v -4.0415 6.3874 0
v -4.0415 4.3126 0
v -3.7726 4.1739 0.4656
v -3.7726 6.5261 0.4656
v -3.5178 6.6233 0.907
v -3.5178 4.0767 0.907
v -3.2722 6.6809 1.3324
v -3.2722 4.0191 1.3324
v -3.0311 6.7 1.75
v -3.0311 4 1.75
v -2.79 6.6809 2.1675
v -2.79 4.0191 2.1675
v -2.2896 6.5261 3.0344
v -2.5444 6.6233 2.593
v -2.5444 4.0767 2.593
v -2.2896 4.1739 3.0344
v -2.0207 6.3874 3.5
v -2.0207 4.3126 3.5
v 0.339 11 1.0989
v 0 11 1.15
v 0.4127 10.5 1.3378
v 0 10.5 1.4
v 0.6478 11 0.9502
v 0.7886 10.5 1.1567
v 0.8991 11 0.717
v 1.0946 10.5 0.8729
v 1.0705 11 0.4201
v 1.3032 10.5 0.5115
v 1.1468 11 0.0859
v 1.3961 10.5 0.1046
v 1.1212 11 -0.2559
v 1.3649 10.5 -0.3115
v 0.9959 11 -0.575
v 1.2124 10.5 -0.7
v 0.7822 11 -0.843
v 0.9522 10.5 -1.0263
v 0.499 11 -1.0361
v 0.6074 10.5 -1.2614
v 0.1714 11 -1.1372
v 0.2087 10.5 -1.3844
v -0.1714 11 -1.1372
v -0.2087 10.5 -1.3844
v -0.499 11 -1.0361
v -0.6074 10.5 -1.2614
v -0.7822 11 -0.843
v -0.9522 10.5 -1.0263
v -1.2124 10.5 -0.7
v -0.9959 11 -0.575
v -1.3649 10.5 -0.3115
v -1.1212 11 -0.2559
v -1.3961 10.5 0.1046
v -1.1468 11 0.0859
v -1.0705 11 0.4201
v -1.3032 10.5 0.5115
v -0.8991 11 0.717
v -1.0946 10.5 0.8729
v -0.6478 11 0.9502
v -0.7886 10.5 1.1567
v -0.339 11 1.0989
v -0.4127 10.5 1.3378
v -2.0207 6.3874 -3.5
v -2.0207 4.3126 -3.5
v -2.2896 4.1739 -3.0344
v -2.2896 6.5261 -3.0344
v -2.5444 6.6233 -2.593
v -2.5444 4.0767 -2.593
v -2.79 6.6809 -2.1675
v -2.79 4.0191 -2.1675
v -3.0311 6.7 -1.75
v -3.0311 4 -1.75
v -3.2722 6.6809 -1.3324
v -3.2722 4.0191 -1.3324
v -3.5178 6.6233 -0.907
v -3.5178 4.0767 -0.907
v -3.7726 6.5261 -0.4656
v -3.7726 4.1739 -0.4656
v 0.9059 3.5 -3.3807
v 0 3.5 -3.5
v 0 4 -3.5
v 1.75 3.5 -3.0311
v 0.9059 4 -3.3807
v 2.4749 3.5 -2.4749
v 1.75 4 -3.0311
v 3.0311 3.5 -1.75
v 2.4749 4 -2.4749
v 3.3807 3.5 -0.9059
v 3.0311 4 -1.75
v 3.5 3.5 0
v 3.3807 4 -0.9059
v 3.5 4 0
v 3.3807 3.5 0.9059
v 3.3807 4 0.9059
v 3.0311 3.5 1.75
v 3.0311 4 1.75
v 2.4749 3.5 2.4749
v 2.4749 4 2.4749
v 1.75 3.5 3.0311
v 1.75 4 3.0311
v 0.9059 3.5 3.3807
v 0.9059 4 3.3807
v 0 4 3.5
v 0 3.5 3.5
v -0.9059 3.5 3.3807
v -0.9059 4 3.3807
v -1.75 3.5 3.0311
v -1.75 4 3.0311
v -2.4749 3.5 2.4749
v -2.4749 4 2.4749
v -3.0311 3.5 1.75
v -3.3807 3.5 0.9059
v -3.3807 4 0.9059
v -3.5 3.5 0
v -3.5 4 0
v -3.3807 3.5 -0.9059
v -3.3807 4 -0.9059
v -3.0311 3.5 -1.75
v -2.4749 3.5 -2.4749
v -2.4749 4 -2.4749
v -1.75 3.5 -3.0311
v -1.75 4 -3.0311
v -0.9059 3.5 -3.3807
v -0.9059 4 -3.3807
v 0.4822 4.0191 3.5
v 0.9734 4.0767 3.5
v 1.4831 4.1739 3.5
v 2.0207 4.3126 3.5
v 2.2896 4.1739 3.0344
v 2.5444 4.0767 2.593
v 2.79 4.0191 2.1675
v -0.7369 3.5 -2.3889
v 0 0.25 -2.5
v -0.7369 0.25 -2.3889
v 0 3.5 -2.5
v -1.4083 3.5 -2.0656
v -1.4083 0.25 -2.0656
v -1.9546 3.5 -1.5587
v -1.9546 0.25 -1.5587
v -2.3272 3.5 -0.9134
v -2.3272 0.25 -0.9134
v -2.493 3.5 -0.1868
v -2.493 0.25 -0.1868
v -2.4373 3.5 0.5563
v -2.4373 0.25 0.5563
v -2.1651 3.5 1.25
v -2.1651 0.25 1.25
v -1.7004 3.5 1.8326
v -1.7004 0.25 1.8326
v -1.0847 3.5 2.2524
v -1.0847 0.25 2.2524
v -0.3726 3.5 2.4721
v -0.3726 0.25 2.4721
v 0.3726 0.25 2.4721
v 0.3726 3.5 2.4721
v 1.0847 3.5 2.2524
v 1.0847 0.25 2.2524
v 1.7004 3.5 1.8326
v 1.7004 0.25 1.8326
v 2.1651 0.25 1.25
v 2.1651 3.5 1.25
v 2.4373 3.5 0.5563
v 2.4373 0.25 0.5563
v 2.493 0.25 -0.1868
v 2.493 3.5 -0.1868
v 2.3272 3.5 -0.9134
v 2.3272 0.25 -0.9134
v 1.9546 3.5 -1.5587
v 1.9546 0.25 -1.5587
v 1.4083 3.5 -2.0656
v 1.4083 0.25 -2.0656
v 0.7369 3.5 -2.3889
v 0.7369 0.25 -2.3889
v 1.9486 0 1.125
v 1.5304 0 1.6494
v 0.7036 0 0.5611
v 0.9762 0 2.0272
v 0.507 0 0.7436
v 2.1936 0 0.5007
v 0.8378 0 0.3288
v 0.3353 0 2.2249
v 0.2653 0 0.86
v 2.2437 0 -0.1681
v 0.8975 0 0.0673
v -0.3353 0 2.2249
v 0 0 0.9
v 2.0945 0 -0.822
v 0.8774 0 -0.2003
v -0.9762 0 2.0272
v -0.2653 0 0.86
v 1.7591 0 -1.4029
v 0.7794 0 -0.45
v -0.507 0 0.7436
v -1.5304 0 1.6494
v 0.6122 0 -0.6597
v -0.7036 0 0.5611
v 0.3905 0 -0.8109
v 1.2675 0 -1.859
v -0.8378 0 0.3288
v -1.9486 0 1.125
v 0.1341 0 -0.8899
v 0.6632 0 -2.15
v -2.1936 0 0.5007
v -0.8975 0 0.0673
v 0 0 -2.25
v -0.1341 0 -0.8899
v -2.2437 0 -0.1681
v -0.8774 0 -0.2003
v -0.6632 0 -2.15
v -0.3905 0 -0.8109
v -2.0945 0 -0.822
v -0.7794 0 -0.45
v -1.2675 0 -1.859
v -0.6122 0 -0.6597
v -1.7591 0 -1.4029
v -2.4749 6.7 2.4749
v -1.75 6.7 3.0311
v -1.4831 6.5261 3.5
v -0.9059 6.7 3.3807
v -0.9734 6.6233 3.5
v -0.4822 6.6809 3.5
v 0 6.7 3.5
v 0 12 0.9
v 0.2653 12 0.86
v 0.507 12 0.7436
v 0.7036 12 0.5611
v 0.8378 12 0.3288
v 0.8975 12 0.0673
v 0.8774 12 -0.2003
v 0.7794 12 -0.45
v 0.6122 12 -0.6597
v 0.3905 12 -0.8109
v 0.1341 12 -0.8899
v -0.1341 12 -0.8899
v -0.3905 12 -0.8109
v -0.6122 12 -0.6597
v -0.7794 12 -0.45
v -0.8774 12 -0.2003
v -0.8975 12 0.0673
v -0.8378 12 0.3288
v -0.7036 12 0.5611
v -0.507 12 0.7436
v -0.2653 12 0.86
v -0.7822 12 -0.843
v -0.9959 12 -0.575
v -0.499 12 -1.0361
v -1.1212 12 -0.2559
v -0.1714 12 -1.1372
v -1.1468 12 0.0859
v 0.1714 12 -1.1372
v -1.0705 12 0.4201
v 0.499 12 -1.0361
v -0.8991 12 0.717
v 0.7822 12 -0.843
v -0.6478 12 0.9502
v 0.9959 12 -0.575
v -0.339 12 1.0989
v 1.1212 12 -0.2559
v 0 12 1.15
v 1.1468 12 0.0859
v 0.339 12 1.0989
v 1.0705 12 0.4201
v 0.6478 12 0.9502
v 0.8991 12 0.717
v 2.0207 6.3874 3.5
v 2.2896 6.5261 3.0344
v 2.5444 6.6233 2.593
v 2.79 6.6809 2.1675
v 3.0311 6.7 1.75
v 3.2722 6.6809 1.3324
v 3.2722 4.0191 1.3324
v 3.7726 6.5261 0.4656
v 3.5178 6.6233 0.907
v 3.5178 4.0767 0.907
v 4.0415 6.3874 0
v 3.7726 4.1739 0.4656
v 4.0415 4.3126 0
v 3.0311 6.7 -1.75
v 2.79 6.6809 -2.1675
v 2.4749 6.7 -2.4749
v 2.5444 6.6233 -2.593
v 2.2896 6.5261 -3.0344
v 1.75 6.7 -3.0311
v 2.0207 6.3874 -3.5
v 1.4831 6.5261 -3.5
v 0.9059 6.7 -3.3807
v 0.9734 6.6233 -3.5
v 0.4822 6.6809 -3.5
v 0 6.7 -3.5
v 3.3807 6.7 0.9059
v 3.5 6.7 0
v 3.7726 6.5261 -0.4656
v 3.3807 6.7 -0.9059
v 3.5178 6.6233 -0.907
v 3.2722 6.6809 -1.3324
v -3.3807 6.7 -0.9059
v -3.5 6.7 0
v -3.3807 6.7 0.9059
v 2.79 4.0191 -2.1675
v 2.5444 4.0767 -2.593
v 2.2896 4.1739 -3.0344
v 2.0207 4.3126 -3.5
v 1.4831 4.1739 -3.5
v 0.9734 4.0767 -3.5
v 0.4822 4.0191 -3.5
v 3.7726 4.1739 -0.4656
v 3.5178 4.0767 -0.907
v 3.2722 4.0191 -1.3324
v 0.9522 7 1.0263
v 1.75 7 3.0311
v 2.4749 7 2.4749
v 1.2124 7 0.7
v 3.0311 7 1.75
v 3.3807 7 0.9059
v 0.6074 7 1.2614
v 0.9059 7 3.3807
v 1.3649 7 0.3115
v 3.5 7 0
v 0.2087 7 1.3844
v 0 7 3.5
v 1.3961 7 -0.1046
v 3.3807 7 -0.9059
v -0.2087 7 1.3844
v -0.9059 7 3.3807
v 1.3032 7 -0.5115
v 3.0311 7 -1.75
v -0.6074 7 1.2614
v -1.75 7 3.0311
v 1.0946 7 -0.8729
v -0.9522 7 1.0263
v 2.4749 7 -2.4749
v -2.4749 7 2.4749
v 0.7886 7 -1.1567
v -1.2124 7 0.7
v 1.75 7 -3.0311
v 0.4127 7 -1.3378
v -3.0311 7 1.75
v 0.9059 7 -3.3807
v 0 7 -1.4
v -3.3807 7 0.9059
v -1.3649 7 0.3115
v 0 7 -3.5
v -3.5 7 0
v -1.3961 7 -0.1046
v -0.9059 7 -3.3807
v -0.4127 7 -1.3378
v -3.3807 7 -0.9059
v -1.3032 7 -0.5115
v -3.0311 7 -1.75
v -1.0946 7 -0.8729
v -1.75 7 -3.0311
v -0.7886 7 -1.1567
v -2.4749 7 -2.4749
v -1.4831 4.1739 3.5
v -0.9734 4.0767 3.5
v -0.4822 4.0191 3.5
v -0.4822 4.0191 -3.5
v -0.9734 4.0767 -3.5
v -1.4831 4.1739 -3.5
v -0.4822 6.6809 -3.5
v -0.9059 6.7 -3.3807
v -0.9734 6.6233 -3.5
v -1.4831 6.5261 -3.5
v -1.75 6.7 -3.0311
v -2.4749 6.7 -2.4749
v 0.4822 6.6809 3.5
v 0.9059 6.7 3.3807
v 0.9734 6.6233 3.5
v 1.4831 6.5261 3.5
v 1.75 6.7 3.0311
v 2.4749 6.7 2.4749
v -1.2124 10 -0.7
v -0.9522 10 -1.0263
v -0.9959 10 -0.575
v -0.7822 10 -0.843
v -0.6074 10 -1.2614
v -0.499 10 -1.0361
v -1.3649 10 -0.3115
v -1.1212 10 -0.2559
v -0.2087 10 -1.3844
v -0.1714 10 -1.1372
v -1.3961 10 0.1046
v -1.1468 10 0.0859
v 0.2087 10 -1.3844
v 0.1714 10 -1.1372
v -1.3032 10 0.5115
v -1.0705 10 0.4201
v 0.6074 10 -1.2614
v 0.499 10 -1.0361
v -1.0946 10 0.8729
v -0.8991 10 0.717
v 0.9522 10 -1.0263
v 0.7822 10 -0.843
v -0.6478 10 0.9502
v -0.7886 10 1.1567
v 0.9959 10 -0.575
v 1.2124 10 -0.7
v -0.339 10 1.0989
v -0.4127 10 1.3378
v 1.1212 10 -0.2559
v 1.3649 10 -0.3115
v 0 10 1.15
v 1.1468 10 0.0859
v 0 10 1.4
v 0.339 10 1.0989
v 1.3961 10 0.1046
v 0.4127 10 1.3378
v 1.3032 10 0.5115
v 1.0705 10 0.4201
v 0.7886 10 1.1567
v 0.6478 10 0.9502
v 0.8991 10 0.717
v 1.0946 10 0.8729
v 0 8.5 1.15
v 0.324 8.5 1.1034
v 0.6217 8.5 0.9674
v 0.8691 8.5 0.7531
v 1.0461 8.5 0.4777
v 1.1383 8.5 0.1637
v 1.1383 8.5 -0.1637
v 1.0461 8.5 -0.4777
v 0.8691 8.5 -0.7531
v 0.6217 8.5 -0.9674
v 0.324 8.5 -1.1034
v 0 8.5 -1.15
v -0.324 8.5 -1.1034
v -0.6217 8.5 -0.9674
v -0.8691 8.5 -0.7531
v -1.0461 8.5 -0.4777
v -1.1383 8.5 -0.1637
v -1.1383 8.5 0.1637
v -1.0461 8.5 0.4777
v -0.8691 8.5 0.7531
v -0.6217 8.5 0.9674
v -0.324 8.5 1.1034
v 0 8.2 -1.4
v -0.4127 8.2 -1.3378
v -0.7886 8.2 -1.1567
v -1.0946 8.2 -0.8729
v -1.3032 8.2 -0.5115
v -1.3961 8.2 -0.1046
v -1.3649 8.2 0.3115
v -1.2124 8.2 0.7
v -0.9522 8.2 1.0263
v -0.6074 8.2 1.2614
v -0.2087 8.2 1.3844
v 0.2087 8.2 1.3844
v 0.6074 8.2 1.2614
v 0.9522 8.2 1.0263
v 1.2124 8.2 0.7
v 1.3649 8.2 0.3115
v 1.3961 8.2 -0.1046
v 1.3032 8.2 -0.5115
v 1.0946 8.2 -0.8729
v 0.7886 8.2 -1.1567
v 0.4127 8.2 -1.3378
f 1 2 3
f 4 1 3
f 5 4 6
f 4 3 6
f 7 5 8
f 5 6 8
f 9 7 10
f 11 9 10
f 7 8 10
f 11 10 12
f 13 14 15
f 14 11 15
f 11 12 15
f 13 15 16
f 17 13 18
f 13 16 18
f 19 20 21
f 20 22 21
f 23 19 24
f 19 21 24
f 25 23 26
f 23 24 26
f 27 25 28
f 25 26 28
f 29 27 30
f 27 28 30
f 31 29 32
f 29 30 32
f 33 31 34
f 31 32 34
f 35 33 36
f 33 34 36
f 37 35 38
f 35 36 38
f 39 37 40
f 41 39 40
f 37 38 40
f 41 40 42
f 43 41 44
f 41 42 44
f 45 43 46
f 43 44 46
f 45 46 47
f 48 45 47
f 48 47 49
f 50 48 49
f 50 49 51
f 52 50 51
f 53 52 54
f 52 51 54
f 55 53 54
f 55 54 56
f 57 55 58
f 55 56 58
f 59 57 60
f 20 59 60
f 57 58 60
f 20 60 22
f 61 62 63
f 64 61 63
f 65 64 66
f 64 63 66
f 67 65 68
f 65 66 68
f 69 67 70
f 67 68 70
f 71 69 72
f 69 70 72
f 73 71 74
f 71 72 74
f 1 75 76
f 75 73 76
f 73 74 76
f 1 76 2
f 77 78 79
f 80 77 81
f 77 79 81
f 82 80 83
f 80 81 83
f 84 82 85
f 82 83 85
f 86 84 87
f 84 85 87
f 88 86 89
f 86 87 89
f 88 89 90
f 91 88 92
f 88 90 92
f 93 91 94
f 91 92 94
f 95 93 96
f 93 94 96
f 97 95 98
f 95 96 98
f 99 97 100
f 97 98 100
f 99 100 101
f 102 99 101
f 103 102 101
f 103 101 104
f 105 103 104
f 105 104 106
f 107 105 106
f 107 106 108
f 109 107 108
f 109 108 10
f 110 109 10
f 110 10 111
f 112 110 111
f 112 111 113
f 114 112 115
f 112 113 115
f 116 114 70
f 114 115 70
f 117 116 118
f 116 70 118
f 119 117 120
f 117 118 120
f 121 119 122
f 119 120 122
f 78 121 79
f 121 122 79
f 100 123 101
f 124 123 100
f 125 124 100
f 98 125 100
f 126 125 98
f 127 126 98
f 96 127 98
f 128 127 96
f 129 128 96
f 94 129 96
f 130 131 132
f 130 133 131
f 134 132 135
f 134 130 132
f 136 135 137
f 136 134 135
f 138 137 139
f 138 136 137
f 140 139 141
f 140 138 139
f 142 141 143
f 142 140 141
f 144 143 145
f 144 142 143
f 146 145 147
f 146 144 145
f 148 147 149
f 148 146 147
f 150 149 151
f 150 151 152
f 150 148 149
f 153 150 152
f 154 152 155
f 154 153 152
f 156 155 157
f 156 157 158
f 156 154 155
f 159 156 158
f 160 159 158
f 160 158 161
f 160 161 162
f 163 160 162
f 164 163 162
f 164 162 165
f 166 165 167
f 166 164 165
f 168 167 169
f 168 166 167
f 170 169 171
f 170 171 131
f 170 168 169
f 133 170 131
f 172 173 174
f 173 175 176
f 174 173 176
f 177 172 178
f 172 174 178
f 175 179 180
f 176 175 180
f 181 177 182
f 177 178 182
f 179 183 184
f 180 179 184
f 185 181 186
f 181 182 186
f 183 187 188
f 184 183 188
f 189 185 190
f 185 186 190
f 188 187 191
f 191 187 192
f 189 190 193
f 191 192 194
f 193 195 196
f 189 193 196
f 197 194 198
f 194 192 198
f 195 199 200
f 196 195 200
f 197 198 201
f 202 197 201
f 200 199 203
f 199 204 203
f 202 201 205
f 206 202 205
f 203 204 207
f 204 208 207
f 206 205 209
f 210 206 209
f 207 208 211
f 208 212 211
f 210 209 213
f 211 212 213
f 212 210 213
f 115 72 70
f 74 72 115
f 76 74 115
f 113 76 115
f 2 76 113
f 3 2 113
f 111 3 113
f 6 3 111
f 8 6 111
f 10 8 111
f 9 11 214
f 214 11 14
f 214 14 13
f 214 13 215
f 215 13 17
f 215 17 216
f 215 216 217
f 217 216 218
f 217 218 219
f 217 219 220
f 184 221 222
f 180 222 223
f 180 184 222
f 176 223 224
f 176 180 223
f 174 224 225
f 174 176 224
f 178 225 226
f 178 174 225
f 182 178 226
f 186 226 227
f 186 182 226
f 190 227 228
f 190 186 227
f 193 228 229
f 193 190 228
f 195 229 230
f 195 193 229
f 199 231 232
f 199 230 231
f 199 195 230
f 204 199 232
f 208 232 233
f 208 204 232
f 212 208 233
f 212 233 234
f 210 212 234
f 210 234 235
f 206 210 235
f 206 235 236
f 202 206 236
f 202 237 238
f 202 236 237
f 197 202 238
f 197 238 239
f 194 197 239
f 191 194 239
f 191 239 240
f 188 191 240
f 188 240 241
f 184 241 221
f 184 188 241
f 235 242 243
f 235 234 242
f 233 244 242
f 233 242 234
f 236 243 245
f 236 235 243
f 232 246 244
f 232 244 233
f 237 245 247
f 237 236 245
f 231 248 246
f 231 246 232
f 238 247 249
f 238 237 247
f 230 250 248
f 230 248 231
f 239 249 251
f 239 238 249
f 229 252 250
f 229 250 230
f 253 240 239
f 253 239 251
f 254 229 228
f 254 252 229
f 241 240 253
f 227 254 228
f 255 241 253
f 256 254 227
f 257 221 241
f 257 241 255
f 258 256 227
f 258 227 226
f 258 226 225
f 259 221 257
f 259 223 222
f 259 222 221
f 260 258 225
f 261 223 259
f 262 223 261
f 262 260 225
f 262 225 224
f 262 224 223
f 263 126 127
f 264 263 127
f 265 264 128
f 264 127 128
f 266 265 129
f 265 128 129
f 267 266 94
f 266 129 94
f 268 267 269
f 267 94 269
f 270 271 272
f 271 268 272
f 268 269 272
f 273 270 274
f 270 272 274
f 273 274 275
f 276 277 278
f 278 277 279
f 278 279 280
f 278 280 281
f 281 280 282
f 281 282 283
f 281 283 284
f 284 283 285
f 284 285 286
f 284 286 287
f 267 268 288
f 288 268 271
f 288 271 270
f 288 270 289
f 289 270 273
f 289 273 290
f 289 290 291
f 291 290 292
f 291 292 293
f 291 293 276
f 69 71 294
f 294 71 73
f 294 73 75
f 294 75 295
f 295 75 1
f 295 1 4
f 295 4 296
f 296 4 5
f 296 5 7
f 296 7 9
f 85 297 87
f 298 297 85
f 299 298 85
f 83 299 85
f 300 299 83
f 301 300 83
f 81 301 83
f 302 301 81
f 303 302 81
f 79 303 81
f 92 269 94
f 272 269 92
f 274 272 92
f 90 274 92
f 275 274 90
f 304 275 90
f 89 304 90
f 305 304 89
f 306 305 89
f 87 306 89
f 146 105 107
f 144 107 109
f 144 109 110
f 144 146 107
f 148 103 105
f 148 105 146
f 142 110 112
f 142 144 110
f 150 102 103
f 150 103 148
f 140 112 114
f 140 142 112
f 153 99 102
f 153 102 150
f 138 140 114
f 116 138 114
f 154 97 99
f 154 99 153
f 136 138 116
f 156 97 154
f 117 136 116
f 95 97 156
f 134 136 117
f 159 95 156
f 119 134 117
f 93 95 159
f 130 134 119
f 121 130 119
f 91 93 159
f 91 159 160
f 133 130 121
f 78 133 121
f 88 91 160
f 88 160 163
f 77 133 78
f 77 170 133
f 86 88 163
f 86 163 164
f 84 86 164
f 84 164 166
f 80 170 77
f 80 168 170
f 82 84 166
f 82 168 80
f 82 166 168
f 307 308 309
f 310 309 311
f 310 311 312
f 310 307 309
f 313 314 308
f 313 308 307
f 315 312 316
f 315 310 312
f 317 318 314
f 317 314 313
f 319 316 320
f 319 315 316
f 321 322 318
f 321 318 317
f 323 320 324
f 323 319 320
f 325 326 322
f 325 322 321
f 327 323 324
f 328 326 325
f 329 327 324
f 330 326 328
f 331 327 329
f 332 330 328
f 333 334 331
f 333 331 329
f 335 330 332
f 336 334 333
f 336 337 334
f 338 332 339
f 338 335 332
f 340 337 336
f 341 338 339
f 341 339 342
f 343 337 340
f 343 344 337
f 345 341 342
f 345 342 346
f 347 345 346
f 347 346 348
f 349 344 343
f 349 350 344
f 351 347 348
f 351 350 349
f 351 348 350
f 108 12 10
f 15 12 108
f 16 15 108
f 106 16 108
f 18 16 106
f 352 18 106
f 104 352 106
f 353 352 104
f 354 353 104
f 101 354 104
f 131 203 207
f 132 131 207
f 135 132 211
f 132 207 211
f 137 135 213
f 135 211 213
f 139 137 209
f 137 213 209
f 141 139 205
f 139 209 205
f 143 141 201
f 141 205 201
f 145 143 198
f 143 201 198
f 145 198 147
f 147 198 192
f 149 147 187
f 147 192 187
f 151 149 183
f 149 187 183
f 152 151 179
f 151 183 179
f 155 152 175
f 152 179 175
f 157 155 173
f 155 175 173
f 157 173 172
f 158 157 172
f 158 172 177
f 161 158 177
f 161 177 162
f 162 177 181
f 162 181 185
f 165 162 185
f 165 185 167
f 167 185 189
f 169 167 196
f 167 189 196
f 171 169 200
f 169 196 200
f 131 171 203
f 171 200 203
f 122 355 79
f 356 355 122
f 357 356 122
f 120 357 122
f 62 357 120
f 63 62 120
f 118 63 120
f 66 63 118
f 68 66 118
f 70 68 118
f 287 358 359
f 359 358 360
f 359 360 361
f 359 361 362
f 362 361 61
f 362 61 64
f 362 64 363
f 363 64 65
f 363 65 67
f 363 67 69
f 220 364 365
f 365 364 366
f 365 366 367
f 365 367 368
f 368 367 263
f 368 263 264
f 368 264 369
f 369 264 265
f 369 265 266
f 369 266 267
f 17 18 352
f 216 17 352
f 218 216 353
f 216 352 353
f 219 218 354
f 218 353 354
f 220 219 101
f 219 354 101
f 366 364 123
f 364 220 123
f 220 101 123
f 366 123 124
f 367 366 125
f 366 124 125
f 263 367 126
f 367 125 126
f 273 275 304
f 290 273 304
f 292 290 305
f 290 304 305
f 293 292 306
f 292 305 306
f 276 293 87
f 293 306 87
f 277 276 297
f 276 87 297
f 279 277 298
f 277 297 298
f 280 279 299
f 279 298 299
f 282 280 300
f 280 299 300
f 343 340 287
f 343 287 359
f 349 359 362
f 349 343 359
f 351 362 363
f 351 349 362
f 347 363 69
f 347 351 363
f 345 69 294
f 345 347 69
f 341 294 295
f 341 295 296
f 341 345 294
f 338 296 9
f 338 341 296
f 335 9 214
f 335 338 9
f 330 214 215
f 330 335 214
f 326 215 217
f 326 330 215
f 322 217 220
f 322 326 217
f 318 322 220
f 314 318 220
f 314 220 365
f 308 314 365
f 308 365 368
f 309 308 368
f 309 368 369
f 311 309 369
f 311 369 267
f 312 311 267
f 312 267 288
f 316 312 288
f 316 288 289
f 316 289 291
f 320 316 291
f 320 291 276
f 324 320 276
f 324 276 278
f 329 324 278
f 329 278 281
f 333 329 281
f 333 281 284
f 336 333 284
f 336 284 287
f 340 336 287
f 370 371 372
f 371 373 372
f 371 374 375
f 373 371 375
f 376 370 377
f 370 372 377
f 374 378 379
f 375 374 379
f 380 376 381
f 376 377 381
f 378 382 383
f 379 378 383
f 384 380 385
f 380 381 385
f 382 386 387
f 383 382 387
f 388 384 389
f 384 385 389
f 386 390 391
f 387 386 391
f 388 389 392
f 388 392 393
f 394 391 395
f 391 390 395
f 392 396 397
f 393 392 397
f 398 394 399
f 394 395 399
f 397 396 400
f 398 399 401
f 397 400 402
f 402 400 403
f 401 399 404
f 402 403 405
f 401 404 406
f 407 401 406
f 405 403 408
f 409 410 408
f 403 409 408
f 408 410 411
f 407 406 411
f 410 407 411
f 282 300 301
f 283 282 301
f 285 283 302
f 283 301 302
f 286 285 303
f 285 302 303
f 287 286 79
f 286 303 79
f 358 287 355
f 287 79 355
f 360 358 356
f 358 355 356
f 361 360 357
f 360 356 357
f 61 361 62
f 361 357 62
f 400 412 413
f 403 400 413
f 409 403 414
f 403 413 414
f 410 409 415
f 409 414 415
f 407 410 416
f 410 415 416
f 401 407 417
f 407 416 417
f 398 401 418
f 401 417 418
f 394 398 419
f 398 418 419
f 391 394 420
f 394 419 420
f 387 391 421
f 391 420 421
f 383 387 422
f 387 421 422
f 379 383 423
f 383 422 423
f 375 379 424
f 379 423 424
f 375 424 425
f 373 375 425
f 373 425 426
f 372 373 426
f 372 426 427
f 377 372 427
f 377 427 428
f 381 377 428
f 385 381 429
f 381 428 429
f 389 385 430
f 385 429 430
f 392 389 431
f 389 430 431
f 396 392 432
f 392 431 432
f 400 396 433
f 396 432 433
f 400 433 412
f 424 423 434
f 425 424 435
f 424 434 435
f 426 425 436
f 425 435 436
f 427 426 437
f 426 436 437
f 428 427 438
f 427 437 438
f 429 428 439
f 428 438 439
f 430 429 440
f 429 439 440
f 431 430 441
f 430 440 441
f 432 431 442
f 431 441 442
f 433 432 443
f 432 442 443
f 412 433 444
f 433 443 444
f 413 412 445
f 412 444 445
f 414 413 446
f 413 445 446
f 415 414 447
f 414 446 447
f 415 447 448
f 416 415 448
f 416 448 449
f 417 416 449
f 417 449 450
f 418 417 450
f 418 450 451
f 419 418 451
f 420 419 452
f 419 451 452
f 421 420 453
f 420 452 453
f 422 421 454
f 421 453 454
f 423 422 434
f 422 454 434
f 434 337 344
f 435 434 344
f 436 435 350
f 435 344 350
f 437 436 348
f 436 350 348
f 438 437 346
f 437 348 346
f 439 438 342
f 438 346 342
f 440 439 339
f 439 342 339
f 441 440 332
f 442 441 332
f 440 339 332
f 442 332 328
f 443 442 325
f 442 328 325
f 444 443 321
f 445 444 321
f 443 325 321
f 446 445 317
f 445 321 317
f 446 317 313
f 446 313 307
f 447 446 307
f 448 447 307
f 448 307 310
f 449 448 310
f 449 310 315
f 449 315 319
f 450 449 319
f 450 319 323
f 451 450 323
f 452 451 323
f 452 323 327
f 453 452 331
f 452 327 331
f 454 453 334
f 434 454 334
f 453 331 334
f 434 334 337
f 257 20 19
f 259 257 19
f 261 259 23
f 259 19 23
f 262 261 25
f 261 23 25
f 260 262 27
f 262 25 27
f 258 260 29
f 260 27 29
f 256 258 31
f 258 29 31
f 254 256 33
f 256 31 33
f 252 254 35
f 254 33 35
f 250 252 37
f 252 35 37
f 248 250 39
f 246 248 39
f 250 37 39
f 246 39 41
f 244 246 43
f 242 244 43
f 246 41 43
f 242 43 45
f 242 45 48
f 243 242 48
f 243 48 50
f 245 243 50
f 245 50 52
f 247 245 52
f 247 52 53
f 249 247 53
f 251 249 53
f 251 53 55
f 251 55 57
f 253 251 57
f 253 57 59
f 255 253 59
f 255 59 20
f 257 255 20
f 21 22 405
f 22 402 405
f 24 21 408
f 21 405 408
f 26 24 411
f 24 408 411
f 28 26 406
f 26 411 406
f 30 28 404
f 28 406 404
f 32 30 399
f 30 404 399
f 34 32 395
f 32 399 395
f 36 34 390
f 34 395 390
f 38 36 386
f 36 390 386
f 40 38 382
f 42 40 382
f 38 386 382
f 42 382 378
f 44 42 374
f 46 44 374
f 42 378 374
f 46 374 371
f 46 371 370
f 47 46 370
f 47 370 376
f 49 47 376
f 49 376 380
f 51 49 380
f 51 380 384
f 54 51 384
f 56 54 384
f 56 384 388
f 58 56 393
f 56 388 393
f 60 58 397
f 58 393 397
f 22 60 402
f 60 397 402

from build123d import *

# Parameters (mm, degrees)
THREADS_SKETCH_W  = 2.5
THREADS_SKETCH_H  = 4
THREADS_CHAM_SIZE = 0.25
NUT_DEPTH         = 2.7
GASKET_SKETCH_R   = 3.5
GASKET_DEPTH      = 0.5
STEM_SKETCH_R     = 1.15
STEM_DEPTH        = 5.3
TOP_START         = 0.3
TOP_FLAT_SKETCH_R = 3.5
TOP_FLAT_DEPTH    = 0.3
PORT_SKETCH_R     = 0.9
PORT_DEPTH        = 14.137097599


with BuildPart() as part:
    # Threads_Sketch → Threads (revolve)
    with BuildSketch(Plane.XY, mode=Mode.PRIVATE) as threads_sk:
        with Locations((-1.25, 2)):
            Rectangle(THREADS_SKETCH_W, THREADS_SKETCH_H)
    revolve(threads_sk.sketch.rotate(Axis((0, 0, 0), (0, 1, 0)), 270), axis=Axis((0, 0, 0), (0, 1, 0)))

    # Threads Cham
    threads_cham_edges = [part.edges().sort_by_distance(p)[0] for p in [
        (0, 0, 2.5),
    ]]
    chamfer(threads_cham_edges, length=THREADS_CHAM_SIZE)

    # Nut_Sketch → Nut (add)
    with BuildSketch(Plane(origin=(0, 4, 0), x_dir=(-1, 0, 0), z_dir=(0, 1, 0))):
        Polygon((-4.041451884, 0), (-2.020725942, -3.5), (2.020725942, -3.5), (4.041451884, 0), (2.020725942, 3.5), (-2.020725942, 3.5), align=None)
    extrude(amount=NUT_DEPTH)

    # Nut Cham_Sketch → Nut Cham (revolve, cut)
    with BuildSketch(Plane.XY, mode=Mode.PRIVATE) as nut_cham_sk:
        Polygon((-4.041451884, 4.312607391), (-4.041451884, 4), (-3.5, 4), align=None)
        Polygon((-3.5, 6.7), (-4.041451884, 6.387392609), (-4.041451884, 6.7), align=None)
    revolve(nut_cham_sk.sketch.rotate(Axis((0, 0, 0), (0, 1, 0)), 90), axis=Axis((0, 0, 0), (0, 1, 0)), mode=Mode.SUBTRACT)

    # Gasket_Sketch → Gasket (add)
    with BuildSketch(Plane.XZ.offset(-4)):
        with Locations(Location((0, 0, 0), (0, 0, 270))):
            Circle(GASKET_SKETCH_R)
    extrude(amount=GASKET_DEPTH)

    # Stem_Sketch → Stem (add)
    with BuildSketch(Plane(origin=(0, 6.7, 0), x_dir=(-1, 0, 0), z_dir=(0, 1, 0))):
        with Locations(Location((0, 0, 0), (0, 0, 90))):
            Circle(STEM_SKETCH_R)
    extrude(amount=STEM_DEPTH)

    # Top Flat_Sketch → Top Flat (add)
    with BuildSketch(Plane(origin=(0, 6.7, 0), x_dir=(-1, 0, 0), z_dir=(0, 1, 0)).offset(TOP_START)):
        with Locations(Location((0, 0, 0), (0, 0, 270))):
            Circle(TOP_FLAT_SKETCH_R)
    extrude(amount=-TOP_FLAT_DEPTH)

    # Outside Barb_Sketch → Outside Barb (revolve)
    with BuildSketch(Plane.XY, mode=Mode.PRIVATE) as outside_barb_sk:
        Polygon((0, 11), (-1.15, 11), (-1.4, 10.5), (-1.4, 10), (0, 10), align=None)
    revolve(outside_barb_sk.sketch.rotate(Axis((0, 0, 0), (0, 1, 0)), 90), axis=Axis((0, 0, 0), (0, 1, 0)))

    # Inside Barb 2_Sketch → Inside Barb 2 (revolve)
    with BuildSketch(Plane.XY, mode=Mode.PRIVATE) as inside_barb_2_sk:
        Polygon((0, 8.5), (-1.15, 8.5), (-1.4, 8.2), (-1.4, 6.7), (0, 6.7), align=None)
    revolve(inside_barb_2_sk.sketch.rotate(Axis((0, 0, 0), (0, 1, 0)), 270), axis=Axis((0, 0, 0), (0, 1, 0)))

    # Port_Sketch → Port (cut, through all)
    with BuildSketch(Plane(origin=(0, 0, 0), x_dir=(1, 0, 0), z_dir=(0, 1, 0))):
        with Locations(Location((0, 0, 0), (0, 0, 270))):
            Circle(PORT_SKETCH_R)
    extrude(amount=PORT_DEPTH, mode=Mode.SUBTRACT)


solid = part.part
